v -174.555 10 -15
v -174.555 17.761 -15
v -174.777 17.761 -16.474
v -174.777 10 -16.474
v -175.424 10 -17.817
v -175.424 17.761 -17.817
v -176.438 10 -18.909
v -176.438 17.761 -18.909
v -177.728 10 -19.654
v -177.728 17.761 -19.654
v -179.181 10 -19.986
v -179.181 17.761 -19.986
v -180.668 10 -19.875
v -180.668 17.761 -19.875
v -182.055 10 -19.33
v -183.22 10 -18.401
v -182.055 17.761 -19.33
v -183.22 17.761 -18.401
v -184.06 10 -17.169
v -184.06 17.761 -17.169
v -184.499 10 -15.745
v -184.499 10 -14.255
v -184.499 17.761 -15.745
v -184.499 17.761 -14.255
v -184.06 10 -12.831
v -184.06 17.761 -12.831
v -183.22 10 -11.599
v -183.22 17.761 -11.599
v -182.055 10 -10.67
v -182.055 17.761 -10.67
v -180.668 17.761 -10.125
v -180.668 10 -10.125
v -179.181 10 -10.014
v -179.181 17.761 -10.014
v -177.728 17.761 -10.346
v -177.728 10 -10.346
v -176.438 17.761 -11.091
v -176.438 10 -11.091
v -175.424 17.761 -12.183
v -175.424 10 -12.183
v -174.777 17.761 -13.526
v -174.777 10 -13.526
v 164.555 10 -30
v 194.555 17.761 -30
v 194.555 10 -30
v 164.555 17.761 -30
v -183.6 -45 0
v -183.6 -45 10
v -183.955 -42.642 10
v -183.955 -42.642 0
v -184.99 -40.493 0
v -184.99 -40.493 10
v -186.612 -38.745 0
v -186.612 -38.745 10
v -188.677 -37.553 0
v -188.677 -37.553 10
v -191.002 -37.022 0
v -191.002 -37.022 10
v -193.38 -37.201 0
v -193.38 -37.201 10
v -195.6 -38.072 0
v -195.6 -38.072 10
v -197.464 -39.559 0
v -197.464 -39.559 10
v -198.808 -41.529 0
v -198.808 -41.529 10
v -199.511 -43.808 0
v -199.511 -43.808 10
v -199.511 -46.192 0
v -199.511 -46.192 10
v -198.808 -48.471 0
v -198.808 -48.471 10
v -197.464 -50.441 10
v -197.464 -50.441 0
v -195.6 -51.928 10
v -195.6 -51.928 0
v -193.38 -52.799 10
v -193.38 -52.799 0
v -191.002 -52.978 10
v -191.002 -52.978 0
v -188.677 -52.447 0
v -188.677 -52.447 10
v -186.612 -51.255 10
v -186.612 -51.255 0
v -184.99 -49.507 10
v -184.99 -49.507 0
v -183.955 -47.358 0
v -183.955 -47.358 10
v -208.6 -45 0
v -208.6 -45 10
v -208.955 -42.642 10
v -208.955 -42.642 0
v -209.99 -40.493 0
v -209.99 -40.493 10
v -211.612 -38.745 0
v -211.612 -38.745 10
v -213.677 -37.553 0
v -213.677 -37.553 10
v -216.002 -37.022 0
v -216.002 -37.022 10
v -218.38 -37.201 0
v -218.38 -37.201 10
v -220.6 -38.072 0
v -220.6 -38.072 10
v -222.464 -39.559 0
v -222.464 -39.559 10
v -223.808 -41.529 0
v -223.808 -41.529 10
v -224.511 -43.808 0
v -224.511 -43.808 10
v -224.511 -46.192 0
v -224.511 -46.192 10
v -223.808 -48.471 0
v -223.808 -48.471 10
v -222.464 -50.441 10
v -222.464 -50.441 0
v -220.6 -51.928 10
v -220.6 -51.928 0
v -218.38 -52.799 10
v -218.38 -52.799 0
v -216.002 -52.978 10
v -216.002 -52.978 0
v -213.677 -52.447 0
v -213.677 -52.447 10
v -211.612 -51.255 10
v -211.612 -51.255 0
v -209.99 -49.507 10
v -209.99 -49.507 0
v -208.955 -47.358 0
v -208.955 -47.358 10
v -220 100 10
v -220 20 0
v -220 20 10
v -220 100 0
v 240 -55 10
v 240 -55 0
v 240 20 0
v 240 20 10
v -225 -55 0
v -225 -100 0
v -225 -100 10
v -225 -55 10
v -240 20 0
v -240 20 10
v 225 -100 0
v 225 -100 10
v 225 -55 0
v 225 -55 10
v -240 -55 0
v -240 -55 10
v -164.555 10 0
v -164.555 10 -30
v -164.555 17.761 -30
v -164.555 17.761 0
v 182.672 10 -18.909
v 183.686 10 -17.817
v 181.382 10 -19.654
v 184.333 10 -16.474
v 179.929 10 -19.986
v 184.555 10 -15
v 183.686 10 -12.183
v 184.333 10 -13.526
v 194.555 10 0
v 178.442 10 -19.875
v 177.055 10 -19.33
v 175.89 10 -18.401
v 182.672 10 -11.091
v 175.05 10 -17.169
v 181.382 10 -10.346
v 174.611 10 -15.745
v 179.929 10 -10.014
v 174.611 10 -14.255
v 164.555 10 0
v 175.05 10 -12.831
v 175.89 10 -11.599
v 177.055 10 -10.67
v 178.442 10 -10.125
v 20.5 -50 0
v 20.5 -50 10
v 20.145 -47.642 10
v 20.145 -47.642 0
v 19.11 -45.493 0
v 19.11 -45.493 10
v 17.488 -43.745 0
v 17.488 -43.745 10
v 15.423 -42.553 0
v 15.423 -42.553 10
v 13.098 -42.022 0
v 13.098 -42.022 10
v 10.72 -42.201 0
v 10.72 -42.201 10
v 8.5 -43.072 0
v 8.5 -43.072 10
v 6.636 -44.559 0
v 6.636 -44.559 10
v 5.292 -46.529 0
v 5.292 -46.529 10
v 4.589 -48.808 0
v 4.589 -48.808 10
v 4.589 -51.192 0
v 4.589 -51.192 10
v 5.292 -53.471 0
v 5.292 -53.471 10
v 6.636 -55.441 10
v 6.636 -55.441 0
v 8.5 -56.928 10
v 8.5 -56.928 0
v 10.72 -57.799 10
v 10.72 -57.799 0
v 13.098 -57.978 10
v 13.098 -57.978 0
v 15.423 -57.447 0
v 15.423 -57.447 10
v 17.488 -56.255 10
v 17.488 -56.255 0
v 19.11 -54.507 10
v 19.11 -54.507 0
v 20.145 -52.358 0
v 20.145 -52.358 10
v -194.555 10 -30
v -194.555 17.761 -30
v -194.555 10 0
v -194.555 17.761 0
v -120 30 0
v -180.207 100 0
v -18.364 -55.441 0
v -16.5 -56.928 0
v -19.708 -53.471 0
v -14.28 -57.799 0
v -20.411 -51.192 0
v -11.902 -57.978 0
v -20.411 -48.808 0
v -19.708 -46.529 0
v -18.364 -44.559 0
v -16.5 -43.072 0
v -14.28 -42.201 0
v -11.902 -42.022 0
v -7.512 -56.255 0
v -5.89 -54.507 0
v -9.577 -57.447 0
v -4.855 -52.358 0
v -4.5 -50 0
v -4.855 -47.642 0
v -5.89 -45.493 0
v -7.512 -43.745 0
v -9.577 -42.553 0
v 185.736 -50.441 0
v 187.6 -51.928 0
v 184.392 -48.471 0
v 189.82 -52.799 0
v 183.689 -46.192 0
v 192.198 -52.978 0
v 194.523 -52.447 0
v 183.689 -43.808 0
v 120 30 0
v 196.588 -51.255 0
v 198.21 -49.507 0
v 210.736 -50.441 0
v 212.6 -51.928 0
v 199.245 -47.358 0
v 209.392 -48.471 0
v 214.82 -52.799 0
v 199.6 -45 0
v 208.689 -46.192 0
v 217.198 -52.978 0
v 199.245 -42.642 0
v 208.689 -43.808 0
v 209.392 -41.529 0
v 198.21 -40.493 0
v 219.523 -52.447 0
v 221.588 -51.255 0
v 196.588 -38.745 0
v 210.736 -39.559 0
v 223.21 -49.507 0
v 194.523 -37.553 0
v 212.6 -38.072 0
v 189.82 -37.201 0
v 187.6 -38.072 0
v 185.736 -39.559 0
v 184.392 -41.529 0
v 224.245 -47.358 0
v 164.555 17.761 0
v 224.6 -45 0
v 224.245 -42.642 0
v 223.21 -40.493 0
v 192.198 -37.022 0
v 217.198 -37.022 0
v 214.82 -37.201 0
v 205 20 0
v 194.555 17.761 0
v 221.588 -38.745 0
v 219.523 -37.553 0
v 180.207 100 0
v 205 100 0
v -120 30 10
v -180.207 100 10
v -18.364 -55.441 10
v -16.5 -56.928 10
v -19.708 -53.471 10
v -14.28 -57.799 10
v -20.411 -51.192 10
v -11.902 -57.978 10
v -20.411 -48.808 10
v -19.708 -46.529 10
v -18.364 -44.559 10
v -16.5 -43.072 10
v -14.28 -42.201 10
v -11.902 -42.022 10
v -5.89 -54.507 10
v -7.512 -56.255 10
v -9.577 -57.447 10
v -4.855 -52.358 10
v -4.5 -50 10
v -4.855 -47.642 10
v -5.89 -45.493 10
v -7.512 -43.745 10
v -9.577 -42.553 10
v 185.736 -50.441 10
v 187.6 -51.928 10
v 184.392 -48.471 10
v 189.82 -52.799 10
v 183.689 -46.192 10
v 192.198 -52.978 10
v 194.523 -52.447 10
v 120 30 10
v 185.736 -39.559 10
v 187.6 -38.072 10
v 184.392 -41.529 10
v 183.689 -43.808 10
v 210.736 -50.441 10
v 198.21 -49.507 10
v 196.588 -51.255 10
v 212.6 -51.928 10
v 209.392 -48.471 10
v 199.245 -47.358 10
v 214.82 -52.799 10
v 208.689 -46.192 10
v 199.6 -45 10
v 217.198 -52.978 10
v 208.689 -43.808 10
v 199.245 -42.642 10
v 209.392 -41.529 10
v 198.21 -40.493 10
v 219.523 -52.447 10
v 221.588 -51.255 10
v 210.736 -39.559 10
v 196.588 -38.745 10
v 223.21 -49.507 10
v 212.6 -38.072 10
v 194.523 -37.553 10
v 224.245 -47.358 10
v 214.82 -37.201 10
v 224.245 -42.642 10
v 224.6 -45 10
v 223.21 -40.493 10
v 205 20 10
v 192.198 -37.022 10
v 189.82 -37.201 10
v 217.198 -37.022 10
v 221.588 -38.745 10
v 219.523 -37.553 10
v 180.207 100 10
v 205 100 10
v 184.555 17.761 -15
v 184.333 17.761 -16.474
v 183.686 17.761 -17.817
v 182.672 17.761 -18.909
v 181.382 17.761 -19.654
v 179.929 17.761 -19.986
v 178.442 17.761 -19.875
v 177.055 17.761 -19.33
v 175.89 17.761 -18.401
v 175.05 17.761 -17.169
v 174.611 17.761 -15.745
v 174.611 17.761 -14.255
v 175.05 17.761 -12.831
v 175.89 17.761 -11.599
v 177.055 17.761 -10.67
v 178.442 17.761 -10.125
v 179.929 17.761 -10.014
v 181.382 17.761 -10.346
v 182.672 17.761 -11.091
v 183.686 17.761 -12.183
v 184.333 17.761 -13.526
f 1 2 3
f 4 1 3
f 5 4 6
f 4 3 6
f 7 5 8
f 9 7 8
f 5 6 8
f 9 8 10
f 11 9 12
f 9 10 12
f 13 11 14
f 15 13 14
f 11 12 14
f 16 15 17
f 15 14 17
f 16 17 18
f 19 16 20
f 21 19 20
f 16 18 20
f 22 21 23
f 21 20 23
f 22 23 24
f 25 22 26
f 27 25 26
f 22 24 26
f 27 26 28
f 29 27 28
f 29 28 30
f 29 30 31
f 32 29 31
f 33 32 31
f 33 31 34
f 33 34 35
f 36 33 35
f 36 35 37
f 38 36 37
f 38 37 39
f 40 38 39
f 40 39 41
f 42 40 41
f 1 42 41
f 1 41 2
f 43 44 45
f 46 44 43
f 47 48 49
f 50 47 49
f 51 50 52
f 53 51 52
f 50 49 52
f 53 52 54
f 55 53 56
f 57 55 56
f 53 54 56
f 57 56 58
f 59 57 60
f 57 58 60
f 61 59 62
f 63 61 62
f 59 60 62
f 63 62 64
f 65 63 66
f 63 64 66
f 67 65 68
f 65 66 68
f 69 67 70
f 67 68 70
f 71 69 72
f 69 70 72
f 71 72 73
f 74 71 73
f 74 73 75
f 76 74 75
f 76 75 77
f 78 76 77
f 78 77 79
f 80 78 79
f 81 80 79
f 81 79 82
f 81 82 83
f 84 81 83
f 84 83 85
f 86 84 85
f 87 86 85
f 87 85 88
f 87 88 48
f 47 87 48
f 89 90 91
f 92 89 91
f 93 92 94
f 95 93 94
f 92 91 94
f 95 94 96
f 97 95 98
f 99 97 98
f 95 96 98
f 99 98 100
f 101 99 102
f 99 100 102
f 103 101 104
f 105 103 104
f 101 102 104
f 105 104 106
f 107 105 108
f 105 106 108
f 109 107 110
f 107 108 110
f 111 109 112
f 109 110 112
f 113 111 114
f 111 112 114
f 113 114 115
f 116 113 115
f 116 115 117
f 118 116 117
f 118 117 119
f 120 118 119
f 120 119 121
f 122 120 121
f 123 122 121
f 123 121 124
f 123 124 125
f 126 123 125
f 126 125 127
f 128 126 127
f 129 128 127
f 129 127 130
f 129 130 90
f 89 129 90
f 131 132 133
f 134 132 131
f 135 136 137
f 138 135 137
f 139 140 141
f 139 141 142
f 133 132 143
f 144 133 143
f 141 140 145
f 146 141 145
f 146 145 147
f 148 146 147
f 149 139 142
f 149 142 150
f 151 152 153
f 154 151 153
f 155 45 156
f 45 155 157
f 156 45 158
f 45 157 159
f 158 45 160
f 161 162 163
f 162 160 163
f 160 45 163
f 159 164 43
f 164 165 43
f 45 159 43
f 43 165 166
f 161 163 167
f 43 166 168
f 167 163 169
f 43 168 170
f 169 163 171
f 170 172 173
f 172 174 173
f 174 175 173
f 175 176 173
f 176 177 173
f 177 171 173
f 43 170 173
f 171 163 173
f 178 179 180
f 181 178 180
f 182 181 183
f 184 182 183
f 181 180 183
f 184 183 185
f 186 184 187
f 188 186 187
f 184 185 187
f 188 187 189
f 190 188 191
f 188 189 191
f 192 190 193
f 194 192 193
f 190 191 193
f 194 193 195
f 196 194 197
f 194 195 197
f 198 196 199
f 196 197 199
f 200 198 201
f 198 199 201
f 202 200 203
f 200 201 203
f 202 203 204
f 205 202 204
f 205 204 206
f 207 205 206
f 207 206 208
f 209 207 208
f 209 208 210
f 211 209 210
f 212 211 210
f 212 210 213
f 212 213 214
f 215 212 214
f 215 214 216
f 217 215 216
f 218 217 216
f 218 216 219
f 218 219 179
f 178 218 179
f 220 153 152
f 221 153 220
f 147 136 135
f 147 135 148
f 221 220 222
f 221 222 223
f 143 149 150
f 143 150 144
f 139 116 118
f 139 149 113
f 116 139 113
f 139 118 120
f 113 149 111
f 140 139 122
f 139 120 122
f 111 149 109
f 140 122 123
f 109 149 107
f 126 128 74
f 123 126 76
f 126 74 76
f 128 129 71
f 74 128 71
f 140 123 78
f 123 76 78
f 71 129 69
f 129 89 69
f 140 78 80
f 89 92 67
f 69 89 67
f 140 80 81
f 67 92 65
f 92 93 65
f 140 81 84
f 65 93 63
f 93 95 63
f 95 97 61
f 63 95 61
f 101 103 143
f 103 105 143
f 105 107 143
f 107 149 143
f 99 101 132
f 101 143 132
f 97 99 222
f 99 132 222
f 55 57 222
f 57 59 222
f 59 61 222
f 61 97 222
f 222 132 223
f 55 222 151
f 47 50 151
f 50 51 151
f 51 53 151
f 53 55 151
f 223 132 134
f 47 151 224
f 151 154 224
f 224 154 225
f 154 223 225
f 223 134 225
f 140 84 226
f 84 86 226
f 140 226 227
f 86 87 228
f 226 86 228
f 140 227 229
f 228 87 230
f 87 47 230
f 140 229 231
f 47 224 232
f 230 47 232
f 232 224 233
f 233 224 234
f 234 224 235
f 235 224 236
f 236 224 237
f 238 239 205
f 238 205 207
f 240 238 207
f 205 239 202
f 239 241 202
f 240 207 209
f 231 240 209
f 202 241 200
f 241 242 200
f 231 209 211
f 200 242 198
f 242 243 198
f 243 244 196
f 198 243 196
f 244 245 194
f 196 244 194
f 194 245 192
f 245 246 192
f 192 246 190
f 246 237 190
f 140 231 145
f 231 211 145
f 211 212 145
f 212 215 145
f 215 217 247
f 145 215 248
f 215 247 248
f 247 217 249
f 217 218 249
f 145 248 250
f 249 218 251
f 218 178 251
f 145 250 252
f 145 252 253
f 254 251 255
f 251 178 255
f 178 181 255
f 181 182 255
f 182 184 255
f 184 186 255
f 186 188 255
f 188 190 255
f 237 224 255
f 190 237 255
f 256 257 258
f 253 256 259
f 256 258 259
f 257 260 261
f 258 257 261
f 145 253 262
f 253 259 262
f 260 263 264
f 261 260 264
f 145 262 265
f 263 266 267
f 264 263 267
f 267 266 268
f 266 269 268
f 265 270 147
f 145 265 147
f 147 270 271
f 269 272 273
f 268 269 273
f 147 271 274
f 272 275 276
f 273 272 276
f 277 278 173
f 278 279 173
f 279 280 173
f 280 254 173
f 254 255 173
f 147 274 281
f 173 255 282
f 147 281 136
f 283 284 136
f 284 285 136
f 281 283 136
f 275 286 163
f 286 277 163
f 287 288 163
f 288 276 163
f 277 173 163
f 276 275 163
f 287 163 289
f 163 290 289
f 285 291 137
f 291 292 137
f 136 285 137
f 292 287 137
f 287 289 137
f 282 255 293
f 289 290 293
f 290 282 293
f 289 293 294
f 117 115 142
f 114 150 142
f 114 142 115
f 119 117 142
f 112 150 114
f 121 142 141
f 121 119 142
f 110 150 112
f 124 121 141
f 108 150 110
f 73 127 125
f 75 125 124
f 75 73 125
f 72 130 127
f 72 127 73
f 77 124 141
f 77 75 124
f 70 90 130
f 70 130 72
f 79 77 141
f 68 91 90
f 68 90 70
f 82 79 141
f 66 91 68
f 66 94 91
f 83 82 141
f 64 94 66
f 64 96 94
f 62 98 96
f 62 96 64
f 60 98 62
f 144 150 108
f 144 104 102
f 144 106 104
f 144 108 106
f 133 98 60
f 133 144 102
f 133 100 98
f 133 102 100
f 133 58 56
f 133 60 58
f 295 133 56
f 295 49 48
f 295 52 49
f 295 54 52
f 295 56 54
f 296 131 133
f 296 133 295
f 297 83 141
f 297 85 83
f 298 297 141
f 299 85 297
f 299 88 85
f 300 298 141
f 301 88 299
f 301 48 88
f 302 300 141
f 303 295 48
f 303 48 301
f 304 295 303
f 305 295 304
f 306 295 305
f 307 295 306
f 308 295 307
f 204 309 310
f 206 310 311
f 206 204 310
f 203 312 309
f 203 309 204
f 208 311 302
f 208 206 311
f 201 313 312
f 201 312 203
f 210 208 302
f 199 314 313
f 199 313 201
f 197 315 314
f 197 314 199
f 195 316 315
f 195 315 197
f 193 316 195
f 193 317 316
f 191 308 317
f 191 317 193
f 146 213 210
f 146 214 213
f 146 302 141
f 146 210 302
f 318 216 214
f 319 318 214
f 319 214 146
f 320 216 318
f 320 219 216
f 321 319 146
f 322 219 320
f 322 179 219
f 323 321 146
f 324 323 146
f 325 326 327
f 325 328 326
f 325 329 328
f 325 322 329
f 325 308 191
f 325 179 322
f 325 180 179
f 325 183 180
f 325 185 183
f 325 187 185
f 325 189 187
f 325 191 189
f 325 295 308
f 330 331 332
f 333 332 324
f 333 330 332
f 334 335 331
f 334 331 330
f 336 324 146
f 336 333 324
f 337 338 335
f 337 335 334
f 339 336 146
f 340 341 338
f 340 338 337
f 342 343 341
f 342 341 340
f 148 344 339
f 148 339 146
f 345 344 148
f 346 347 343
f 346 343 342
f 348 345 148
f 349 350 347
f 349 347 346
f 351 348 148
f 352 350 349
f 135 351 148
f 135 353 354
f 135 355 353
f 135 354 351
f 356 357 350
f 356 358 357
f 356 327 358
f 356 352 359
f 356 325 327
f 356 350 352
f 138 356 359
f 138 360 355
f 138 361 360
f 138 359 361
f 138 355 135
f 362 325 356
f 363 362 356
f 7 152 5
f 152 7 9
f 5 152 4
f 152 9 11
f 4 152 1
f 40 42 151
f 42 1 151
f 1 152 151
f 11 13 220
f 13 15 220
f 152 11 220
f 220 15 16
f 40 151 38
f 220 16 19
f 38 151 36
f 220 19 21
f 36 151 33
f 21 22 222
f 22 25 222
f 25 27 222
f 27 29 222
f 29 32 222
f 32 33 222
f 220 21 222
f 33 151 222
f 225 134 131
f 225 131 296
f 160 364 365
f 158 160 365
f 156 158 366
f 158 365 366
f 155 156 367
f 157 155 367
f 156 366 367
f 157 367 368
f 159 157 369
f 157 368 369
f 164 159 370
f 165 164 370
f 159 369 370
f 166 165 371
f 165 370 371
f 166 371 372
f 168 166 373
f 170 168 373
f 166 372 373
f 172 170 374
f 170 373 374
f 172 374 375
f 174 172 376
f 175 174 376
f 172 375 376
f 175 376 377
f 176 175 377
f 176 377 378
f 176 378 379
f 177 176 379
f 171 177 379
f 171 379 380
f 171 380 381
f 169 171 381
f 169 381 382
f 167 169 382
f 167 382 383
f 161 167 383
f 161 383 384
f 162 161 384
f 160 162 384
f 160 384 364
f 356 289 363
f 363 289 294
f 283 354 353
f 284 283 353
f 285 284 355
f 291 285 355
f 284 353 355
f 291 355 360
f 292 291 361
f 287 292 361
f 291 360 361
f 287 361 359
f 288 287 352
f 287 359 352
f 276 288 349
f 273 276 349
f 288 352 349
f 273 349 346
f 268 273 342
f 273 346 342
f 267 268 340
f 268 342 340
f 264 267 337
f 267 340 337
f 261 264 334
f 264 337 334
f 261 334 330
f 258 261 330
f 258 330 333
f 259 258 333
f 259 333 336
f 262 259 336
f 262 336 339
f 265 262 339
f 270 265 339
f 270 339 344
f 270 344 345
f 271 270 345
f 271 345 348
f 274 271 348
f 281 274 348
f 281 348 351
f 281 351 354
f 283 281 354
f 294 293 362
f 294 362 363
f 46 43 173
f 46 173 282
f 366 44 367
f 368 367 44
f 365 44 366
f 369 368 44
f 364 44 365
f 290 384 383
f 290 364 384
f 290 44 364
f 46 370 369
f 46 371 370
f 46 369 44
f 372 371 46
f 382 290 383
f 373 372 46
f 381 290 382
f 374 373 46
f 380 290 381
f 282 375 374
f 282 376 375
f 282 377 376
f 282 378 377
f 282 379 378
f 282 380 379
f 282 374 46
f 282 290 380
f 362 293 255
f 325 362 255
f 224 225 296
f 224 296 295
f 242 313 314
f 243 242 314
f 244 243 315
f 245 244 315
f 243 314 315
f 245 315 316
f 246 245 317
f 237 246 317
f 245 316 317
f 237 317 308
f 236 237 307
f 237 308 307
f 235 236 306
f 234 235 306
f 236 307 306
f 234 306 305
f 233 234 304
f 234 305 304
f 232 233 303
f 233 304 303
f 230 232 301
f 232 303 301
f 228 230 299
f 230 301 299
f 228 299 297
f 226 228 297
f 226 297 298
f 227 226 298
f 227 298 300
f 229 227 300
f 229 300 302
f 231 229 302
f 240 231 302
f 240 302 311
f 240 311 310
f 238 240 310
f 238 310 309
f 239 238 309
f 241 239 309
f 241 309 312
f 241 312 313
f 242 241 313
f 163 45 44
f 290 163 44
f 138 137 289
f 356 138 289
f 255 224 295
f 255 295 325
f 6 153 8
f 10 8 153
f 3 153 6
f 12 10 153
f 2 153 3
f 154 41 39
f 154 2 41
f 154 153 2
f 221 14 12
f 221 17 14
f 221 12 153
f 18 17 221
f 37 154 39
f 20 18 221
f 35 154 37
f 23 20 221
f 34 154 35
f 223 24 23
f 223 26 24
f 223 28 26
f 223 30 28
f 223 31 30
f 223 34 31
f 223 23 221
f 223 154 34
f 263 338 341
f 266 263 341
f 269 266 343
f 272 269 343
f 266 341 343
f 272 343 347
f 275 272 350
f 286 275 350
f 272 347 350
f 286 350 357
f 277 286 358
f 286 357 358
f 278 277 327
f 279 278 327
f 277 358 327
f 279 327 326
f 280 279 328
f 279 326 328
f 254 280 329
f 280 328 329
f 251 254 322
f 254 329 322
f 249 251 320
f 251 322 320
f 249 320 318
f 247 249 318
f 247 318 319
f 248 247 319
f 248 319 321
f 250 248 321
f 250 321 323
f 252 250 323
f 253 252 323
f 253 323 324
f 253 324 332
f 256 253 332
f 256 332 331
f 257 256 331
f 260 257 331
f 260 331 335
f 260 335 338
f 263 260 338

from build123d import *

# Parameters (mm, degrees)
SKETCH1_W           = 480
SKETCH1_H           = 200
BOSS_EXTRUDE1_DEPTH = 10
SKETCH2_W           = 30
SKETCH2_H           = 7.761380017
BOSS_EXTRUDE2_DEPTH = 30
SKETCH3_R           = 5
CUT_EXTRUDE1_DEPTH  = 30
SKETCH5_R           = 8
CUT_EXTRUDE2_DEPTH  = 30
SKETCH6_W           = 15
SKETCH6_H           = 45
SKETCH6_W_2         = 20
SKETCH6_H_2         = 80
SKETCH6_W_3         = 35
CUT_EXTRUDE3_DEPTH  = 10


with BuildPart() as part:
    # Sketch1 → Boss-Extrude1 (new body)
    with BuildSketch(Plane.XY):
        Rectangle(SKETCH1_W, SKETCH1_H)
    extrude(amount=BOSS_EXTRUDE1_DEPTH)

    # Sketch2 → Boss-Extrude2 (add)
    with BuildSketch(Plane(origin=(0, 0, 0), x_dir=(-1, 0, 0), z_dir=(0, 0, -1))):
        with Locations((-179.555, 13.880690009)):
            Rectangle(SKETCH2_W, SKETCH2_H)
        with Locations((179.555, 13.880690009)):
            Rectangle(SKETCH2_W, SKETCH2_H)
    extrude(amount=BOSS_EXTRUDE2_DEPTH)

    # Sketch3 → Cut-Extrude1 (cut)
    with BuildSketch(Plane(origin=(0, 17.761380017, 0), x_dir=(1, 0, 0), z_dir=(0, 1, 0))):
        with Locations((179.555, 15)):
            Circle(SKETCH3_R)
        with Locations((-179.555, 15)):
            Circle(SKETCH3_R)
    extrude(amount=-CUT_EXTRUDE1_DEPTH, mode=Mode.SUBTRACT)

    # Sketch5 → Cut-Extrude2 (cut)
    with BuildSketch(Plane.XY.offset(10)):
        with Locations((-12.5, -50)):
            Circle(SKETCH5_R)
        with Locations((-216.6, -45)):
            Circle(SKETCH5_R)
        with Locations((-191.6, -45)):
            Circle(SKETCH5_R)
        with Locations((12.5, -50)):
            Circle(SKETCH5_R)
        with Locations((191.6, -45)):
            Circle(SKETCH5_R)
        with Locations((216.6, -45)):
            Circle(SKETCH5_R)
        Polygon((140, 100), (90, 30), (-90, 30), (-140, 100), align=None)
    extrude(amount=-CUT_EXTRUDE2_DEPTH, mode=Mode.SUBTRACT)

    # Sketch6 → Cut-Extrude3 (cut)
    with BuildSketch(Plane(origin=(0, 0, 0), x_dir=(-1, 0, 0), z_dir=(0, 0, -1))):
        with Locations((-232.5, -77.5)):
            Rectangle(SKETCH6_W, SKETCH6_H)
        with Locations((232.5, -77.5)):
            Rectangle(SKETCH6_W, SKETCH6_H)
        with Locations((230, 60)):
            Rectangle(SKETCH6_W_2, SKETCH6_H_2)
        with Locations((-222.5, 60)):
            Rectangle(SKETCH6_W_3, SKETCH6_H_2)
        Polygon((140.207027179, 100), (180.207027179, 100), (120, 30), (90, 30), (114.970016322, 100), align=None)
        Polygon((-120, 30), (-90, 30), (-114.970016322, 100), (-140.207027179, 100), (-180.207027179, 100), align=None)
    extrude(amount=-CUT_EXTRUDE3_DEPTH, mode=Mode.SUBTRACT)


solid = part.part
